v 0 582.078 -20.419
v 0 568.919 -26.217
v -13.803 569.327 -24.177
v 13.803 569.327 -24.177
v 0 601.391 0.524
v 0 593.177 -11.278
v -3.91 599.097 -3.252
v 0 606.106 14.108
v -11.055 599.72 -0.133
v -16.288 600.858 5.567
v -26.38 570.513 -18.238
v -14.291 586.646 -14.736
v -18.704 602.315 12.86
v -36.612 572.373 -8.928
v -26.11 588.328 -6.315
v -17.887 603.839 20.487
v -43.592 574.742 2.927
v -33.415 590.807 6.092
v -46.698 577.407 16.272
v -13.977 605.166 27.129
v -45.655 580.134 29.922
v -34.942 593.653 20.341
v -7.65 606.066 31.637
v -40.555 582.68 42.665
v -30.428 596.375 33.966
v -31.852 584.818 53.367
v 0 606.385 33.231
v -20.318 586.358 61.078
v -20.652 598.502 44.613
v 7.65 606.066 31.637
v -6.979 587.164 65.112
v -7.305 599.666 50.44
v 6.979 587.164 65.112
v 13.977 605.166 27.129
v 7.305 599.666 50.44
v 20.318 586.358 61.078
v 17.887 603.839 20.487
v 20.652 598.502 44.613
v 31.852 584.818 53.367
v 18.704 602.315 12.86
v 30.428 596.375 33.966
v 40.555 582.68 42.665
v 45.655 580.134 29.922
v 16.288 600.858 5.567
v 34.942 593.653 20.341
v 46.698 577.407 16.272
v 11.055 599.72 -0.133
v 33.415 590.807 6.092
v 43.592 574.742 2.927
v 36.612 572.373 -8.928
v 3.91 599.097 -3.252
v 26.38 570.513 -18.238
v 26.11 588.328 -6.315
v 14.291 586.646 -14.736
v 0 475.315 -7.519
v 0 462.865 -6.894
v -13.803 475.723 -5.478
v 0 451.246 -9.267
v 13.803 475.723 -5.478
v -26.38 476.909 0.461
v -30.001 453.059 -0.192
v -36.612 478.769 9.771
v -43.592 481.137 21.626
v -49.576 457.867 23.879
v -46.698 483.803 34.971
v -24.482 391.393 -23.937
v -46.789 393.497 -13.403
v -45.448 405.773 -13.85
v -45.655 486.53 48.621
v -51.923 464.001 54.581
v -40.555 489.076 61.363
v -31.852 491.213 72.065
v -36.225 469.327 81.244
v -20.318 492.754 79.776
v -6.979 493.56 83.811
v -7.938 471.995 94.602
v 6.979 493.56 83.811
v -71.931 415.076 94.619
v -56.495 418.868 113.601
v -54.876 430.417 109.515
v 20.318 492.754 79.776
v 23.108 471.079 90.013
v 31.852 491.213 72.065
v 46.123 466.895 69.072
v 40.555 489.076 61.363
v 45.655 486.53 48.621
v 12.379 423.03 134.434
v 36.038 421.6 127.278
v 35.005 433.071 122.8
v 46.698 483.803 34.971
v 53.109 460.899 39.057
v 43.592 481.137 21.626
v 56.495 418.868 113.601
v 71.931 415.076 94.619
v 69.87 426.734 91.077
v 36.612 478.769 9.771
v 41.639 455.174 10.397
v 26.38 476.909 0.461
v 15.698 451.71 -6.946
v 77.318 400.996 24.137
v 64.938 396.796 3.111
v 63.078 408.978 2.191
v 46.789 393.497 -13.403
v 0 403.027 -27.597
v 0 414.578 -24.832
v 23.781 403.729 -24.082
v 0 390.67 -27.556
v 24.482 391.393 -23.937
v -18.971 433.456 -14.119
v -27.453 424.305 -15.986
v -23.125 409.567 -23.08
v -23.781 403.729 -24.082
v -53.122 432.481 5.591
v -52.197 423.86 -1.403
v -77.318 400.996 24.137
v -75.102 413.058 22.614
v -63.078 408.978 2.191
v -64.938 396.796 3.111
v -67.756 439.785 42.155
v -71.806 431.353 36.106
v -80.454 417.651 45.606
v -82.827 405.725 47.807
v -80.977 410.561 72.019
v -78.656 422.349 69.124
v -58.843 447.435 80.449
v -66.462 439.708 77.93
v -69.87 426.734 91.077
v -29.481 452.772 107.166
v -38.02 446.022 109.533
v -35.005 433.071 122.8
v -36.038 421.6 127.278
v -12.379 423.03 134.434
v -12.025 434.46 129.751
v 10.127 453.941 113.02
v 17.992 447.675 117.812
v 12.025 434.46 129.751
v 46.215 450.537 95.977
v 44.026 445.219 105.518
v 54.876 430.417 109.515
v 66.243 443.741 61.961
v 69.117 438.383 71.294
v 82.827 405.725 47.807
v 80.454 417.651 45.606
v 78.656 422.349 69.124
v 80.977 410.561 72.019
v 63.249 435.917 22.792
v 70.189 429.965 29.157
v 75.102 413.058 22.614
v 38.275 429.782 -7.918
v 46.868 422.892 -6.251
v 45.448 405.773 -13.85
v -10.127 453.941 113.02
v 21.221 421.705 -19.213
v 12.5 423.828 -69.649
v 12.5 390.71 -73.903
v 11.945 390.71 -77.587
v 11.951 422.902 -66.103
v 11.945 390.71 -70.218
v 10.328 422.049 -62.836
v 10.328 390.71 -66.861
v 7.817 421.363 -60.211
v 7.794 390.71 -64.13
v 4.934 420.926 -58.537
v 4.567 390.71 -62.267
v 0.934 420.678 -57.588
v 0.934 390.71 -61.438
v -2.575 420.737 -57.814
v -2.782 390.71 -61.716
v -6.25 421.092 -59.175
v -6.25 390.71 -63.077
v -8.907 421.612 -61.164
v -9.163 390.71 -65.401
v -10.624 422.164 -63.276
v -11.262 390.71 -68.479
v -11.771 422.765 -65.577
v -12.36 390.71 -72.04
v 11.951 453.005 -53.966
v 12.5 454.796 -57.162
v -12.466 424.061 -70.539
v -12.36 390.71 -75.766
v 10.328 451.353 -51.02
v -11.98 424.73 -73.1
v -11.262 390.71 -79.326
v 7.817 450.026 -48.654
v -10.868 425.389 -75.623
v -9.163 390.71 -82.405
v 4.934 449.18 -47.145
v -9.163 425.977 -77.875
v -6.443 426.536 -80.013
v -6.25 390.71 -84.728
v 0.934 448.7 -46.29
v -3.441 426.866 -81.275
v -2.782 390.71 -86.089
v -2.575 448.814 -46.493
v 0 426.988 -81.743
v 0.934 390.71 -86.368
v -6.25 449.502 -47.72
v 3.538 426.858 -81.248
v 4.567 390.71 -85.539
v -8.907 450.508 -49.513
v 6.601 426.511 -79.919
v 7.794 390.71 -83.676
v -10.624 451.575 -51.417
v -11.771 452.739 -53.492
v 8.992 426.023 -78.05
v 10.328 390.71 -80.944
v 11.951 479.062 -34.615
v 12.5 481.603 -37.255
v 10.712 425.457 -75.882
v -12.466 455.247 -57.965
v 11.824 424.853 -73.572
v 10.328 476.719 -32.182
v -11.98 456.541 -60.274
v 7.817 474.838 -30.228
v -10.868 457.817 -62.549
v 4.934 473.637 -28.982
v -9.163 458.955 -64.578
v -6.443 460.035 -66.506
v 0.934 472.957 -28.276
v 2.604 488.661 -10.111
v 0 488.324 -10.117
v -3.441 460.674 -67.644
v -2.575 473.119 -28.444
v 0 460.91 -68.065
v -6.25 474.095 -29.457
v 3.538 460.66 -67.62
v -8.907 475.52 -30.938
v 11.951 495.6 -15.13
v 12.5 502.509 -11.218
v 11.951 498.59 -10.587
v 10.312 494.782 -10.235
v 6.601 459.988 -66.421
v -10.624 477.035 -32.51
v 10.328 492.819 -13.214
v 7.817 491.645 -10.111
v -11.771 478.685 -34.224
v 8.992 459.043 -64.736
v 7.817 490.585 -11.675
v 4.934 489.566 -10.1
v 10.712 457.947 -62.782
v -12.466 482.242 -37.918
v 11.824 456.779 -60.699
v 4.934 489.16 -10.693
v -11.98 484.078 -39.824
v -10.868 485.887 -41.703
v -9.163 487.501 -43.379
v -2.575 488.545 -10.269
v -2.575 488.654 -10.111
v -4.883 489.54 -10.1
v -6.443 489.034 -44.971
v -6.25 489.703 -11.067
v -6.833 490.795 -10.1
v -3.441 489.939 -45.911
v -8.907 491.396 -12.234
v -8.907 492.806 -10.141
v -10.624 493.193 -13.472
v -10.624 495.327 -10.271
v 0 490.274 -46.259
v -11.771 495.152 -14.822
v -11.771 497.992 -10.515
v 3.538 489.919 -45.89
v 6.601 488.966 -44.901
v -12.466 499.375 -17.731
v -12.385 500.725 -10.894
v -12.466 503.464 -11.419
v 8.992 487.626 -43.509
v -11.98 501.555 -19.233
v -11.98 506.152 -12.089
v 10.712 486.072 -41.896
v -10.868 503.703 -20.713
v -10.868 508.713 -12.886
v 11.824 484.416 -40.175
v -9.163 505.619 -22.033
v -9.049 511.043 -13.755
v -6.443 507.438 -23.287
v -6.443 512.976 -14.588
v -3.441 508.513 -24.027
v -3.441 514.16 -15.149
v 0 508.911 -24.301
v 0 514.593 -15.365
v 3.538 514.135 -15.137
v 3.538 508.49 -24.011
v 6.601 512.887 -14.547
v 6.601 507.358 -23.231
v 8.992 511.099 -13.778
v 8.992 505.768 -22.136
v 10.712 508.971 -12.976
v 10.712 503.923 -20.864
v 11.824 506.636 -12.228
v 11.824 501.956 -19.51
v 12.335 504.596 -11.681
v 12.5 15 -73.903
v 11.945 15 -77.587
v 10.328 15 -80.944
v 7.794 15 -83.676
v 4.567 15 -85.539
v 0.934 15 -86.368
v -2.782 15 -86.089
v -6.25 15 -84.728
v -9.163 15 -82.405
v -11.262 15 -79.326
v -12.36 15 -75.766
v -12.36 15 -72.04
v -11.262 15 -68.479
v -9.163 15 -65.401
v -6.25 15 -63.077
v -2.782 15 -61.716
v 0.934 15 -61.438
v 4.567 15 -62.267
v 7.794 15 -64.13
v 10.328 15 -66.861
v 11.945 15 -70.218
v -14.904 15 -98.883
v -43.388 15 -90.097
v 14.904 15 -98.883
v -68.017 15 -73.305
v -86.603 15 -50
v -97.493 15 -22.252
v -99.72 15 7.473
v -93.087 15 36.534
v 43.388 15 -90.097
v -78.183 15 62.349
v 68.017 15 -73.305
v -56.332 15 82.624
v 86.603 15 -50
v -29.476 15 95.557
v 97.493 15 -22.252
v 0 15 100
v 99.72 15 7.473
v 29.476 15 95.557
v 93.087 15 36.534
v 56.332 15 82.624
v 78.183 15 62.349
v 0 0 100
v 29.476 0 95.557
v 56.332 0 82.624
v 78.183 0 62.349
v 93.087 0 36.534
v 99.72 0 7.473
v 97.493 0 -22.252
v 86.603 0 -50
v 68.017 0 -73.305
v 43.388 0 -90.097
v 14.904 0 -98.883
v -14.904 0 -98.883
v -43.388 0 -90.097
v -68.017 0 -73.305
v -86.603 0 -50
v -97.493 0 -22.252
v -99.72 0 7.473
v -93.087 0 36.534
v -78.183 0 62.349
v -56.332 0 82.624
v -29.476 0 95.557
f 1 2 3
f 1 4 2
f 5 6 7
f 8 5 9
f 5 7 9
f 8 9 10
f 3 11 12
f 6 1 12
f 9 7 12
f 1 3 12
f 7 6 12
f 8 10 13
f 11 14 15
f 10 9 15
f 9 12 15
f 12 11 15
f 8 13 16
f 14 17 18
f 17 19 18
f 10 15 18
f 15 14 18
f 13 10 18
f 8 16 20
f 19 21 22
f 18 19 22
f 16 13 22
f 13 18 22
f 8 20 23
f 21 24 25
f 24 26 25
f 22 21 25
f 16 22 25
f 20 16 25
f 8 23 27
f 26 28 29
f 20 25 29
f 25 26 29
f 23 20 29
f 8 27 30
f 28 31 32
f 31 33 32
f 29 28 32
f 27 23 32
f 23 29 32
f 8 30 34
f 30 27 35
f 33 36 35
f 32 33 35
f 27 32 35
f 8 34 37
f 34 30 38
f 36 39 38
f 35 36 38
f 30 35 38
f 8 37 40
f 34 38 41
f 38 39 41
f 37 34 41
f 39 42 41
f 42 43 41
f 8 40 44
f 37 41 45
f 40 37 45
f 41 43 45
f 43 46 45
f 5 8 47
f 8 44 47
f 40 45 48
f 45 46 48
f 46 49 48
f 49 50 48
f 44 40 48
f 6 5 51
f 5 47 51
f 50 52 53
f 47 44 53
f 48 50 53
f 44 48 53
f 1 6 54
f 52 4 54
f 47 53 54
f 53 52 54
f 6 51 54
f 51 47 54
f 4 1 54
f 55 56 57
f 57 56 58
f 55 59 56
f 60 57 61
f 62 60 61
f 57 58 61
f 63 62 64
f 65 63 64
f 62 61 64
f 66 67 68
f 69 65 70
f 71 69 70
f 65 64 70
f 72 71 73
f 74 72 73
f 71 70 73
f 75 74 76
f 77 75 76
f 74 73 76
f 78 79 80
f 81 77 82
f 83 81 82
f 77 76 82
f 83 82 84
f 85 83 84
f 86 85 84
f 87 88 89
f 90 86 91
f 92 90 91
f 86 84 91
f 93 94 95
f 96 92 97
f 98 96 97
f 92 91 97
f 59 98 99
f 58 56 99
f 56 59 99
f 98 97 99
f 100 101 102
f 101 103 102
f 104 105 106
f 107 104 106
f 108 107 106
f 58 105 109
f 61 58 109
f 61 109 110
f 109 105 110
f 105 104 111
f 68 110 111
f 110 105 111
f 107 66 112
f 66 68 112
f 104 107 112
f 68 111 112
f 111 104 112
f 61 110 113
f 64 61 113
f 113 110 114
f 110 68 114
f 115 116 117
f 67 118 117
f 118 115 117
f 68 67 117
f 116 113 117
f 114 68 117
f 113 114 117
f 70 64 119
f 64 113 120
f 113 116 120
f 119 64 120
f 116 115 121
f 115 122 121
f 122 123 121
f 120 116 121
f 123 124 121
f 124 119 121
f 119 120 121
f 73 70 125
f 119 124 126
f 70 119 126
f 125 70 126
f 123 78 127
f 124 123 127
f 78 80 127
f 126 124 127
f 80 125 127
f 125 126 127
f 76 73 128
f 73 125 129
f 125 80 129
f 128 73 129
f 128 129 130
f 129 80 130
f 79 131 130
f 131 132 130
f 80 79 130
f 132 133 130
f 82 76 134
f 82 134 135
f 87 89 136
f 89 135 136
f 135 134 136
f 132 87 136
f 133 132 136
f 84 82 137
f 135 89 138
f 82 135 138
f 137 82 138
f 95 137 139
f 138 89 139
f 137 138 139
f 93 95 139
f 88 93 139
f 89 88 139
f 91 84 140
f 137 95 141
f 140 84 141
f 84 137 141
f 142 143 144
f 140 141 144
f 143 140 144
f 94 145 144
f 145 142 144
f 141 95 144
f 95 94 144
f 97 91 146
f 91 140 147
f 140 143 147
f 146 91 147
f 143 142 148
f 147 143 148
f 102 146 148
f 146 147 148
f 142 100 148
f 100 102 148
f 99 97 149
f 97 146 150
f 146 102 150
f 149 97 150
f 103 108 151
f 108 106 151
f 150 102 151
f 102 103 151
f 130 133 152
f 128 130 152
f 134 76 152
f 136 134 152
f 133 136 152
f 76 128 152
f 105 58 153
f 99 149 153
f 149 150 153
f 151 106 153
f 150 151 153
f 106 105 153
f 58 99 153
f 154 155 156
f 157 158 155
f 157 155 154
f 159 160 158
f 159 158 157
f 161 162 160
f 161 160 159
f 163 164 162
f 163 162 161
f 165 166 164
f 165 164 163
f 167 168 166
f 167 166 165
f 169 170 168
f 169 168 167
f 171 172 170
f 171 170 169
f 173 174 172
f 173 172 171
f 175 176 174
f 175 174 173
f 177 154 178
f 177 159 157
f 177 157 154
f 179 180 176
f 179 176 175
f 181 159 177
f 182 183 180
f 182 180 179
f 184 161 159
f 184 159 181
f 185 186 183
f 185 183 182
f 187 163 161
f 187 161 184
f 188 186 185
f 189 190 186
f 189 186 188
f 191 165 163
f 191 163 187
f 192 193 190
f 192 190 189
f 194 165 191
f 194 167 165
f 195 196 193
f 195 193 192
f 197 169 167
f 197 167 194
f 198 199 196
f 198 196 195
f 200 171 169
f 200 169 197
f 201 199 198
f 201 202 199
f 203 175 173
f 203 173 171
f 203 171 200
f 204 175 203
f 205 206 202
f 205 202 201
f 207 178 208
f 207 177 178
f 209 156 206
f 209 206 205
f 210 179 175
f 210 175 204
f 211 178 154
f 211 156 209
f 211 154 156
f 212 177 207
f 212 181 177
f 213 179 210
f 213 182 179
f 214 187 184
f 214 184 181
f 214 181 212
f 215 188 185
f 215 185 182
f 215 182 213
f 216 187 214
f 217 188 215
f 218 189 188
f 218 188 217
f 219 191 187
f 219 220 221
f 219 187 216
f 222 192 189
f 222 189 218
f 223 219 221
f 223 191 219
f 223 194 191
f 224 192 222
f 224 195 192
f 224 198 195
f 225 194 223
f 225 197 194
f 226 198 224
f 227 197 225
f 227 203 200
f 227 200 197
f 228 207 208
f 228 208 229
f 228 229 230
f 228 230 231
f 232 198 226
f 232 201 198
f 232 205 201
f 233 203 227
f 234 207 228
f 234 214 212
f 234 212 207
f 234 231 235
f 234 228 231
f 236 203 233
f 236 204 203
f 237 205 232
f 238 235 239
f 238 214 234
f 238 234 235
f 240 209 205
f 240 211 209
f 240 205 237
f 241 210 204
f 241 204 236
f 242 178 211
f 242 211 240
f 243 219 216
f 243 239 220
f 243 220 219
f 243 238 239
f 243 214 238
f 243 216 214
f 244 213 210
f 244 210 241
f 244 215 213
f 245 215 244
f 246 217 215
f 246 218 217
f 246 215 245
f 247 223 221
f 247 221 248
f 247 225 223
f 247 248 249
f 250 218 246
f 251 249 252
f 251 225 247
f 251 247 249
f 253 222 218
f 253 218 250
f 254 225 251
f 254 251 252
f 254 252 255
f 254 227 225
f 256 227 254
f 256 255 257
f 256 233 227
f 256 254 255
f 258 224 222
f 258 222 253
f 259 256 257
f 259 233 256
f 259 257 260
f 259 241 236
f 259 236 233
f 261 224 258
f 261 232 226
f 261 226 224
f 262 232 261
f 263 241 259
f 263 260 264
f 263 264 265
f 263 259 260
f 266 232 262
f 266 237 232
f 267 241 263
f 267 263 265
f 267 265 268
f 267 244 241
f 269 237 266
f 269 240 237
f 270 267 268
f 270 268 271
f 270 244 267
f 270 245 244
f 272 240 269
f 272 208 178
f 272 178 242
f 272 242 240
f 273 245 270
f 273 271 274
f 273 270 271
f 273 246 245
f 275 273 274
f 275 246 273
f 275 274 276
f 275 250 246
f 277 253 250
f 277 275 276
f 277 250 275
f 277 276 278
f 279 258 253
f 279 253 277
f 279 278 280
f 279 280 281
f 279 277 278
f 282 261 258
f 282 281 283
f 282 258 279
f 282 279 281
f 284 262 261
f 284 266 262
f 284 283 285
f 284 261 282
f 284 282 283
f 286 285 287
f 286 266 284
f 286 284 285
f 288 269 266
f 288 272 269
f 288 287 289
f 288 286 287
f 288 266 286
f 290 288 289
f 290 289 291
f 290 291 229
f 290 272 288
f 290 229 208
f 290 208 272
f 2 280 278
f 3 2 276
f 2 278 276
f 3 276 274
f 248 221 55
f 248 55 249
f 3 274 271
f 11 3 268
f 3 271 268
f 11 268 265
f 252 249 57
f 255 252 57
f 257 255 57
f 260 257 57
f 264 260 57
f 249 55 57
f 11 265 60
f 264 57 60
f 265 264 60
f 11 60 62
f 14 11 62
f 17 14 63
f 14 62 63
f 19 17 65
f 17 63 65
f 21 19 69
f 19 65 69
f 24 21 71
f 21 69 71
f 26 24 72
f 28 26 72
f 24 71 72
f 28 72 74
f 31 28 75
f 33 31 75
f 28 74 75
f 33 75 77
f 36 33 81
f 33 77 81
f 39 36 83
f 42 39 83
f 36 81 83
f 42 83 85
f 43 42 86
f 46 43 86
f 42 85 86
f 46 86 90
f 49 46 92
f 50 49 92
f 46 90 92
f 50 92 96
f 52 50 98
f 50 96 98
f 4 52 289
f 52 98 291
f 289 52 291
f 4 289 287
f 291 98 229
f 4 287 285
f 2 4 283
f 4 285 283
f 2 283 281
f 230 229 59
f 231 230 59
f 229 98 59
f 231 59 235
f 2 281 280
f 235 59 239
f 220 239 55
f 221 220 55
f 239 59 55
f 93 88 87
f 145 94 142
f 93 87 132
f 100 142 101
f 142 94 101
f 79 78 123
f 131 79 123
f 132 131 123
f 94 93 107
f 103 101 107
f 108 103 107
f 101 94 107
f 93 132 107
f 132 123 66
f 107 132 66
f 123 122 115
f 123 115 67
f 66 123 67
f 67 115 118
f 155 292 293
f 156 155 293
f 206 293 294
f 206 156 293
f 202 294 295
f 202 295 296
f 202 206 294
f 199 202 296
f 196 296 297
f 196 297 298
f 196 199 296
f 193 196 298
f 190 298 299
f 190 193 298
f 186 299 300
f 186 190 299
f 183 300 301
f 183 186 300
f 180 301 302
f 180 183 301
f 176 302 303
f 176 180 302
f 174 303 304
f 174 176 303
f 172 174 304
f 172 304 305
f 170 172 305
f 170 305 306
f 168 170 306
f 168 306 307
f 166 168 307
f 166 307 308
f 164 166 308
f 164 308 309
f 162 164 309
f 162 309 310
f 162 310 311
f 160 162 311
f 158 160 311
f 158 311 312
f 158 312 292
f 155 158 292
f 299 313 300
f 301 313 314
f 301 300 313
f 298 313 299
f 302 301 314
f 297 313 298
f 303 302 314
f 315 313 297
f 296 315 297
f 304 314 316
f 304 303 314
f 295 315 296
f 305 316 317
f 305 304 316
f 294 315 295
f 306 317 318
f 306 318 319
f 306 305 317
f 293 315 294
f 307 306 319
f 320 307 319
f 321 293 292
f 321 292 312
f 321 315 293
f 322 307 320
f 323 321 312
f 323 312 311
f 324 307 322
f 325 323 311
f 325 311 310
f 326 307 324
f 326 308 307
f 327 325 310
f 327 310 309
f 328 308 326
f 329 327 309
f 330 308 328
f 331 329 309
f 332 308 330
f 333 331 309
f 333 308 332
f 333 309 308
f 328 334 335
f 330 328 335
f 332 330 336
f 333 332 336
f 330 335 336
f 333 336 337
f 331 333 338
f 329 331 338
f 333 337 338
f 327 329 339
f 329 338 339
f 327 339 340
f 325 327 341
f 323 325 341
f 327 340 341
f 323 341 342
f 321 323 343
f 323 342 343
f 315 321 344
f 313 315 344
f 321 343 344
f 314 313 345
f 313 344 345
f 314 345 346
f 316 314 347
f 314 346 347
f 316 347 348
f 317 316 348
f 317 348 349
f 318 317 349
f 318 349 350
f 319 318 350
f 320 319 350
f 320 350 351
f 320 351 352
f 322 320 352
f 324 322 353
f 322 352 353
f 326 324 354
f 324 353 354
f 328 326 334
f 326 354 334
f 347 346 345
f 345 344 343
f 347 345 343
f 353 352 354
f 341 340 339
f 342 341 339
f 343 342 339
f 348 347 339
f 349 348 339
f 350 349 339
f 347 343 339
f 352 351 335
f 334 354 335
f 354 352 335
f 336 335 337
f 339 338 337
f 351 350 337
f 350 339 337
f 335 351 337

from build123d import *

# Parameters (mm, degrees)
SKETCH_2_R      = 100
EXTRUDE_1_DEPTH = 15
SKETCH_4_R      = 12.5


with BuildPart() as part:
    # 草图2 → 凸台-拉伸1 (new body)
    with BuildSketch(Plane(origin=(0, 0, 0), x_dir=(1, 0, 0), z_dir=(0, 1, 0))):
        with Locations(Location((0, 0, 0), (0, 0, 270))):
            Circle(SKETCH_2_R)
    extrude(amount=EXTRUDE_1_DEPTH)

    # 扫描1: sweep along a path in 草图3
    with BuildLine(Plane(origin=(0, 0, 0), x_dir=(0, 0, -1), z_dir=(1, 0, 0))) as sweep_1_path:
        Line((73.902769021, 15), (73.902769021, 166.562691704))
        Line((73.902769021, 166.562691704), (73.902769021, 390.709968379))
        ThreePointArc((73.902769021, 390.709968379), (44.192308228, 473.798889435), (-31.466612201, 519.210430284))
    # 草图4 → 扫描1 (sweep)
    with BuildSketch(Plane(origin=(0, 15, 0), x_dir=(1, 0, 0), z_dir=(0, 1, 0))):
        with Locations((0, 73.902769021)):
            Circle(SKETCH_4_R)
    sweep(path=sweep_1_path.line)

    # 草图6 → 旋转1 (revolve)
    with BuildSketch(Plane(origin=(0, 25.969403223, 129.999276708), x_dir=(1, 0, 0), z_dir=(0, 0.19589525539003017, 0.9806248257696085)), mode=Mode.PRIVATE) as revolve_1_sk:
        with BuildLine():
            Line((0, 388.498705936), (0, 591.59882287))
            ThreePointArc((0, 591.59882287), (27.426988969, 583.893568856), (46.828622065, 563.032425634))
            Line((46.828622065, 563.032425634), (46.828622065, 467.578854382))
            add(Edge.make_bspline(
                [(46.828622065, 467.578854382), (47.076936917, 435.310697465), (81.229684313, 420.22666255), (83.059174658, 388.498705936)],
                knots=[0, 0, 0, 0, 1, 1, 1, 1], degree=3))
            Line((83.059174658, 388.498705936), (0, 388.498705936))
        make_face()
    revolve(revolve_1_sk.sketch.rotate(Axis((0, 406.940879043, 53.89422349), (0, 0.9806248257696084, -0.19589525539003022)), 90), axis=Axis((0, 406.940879043, 53.89422349), (0, 0.9806248257696084, -0.19589525539003022)))


solid = part.part
